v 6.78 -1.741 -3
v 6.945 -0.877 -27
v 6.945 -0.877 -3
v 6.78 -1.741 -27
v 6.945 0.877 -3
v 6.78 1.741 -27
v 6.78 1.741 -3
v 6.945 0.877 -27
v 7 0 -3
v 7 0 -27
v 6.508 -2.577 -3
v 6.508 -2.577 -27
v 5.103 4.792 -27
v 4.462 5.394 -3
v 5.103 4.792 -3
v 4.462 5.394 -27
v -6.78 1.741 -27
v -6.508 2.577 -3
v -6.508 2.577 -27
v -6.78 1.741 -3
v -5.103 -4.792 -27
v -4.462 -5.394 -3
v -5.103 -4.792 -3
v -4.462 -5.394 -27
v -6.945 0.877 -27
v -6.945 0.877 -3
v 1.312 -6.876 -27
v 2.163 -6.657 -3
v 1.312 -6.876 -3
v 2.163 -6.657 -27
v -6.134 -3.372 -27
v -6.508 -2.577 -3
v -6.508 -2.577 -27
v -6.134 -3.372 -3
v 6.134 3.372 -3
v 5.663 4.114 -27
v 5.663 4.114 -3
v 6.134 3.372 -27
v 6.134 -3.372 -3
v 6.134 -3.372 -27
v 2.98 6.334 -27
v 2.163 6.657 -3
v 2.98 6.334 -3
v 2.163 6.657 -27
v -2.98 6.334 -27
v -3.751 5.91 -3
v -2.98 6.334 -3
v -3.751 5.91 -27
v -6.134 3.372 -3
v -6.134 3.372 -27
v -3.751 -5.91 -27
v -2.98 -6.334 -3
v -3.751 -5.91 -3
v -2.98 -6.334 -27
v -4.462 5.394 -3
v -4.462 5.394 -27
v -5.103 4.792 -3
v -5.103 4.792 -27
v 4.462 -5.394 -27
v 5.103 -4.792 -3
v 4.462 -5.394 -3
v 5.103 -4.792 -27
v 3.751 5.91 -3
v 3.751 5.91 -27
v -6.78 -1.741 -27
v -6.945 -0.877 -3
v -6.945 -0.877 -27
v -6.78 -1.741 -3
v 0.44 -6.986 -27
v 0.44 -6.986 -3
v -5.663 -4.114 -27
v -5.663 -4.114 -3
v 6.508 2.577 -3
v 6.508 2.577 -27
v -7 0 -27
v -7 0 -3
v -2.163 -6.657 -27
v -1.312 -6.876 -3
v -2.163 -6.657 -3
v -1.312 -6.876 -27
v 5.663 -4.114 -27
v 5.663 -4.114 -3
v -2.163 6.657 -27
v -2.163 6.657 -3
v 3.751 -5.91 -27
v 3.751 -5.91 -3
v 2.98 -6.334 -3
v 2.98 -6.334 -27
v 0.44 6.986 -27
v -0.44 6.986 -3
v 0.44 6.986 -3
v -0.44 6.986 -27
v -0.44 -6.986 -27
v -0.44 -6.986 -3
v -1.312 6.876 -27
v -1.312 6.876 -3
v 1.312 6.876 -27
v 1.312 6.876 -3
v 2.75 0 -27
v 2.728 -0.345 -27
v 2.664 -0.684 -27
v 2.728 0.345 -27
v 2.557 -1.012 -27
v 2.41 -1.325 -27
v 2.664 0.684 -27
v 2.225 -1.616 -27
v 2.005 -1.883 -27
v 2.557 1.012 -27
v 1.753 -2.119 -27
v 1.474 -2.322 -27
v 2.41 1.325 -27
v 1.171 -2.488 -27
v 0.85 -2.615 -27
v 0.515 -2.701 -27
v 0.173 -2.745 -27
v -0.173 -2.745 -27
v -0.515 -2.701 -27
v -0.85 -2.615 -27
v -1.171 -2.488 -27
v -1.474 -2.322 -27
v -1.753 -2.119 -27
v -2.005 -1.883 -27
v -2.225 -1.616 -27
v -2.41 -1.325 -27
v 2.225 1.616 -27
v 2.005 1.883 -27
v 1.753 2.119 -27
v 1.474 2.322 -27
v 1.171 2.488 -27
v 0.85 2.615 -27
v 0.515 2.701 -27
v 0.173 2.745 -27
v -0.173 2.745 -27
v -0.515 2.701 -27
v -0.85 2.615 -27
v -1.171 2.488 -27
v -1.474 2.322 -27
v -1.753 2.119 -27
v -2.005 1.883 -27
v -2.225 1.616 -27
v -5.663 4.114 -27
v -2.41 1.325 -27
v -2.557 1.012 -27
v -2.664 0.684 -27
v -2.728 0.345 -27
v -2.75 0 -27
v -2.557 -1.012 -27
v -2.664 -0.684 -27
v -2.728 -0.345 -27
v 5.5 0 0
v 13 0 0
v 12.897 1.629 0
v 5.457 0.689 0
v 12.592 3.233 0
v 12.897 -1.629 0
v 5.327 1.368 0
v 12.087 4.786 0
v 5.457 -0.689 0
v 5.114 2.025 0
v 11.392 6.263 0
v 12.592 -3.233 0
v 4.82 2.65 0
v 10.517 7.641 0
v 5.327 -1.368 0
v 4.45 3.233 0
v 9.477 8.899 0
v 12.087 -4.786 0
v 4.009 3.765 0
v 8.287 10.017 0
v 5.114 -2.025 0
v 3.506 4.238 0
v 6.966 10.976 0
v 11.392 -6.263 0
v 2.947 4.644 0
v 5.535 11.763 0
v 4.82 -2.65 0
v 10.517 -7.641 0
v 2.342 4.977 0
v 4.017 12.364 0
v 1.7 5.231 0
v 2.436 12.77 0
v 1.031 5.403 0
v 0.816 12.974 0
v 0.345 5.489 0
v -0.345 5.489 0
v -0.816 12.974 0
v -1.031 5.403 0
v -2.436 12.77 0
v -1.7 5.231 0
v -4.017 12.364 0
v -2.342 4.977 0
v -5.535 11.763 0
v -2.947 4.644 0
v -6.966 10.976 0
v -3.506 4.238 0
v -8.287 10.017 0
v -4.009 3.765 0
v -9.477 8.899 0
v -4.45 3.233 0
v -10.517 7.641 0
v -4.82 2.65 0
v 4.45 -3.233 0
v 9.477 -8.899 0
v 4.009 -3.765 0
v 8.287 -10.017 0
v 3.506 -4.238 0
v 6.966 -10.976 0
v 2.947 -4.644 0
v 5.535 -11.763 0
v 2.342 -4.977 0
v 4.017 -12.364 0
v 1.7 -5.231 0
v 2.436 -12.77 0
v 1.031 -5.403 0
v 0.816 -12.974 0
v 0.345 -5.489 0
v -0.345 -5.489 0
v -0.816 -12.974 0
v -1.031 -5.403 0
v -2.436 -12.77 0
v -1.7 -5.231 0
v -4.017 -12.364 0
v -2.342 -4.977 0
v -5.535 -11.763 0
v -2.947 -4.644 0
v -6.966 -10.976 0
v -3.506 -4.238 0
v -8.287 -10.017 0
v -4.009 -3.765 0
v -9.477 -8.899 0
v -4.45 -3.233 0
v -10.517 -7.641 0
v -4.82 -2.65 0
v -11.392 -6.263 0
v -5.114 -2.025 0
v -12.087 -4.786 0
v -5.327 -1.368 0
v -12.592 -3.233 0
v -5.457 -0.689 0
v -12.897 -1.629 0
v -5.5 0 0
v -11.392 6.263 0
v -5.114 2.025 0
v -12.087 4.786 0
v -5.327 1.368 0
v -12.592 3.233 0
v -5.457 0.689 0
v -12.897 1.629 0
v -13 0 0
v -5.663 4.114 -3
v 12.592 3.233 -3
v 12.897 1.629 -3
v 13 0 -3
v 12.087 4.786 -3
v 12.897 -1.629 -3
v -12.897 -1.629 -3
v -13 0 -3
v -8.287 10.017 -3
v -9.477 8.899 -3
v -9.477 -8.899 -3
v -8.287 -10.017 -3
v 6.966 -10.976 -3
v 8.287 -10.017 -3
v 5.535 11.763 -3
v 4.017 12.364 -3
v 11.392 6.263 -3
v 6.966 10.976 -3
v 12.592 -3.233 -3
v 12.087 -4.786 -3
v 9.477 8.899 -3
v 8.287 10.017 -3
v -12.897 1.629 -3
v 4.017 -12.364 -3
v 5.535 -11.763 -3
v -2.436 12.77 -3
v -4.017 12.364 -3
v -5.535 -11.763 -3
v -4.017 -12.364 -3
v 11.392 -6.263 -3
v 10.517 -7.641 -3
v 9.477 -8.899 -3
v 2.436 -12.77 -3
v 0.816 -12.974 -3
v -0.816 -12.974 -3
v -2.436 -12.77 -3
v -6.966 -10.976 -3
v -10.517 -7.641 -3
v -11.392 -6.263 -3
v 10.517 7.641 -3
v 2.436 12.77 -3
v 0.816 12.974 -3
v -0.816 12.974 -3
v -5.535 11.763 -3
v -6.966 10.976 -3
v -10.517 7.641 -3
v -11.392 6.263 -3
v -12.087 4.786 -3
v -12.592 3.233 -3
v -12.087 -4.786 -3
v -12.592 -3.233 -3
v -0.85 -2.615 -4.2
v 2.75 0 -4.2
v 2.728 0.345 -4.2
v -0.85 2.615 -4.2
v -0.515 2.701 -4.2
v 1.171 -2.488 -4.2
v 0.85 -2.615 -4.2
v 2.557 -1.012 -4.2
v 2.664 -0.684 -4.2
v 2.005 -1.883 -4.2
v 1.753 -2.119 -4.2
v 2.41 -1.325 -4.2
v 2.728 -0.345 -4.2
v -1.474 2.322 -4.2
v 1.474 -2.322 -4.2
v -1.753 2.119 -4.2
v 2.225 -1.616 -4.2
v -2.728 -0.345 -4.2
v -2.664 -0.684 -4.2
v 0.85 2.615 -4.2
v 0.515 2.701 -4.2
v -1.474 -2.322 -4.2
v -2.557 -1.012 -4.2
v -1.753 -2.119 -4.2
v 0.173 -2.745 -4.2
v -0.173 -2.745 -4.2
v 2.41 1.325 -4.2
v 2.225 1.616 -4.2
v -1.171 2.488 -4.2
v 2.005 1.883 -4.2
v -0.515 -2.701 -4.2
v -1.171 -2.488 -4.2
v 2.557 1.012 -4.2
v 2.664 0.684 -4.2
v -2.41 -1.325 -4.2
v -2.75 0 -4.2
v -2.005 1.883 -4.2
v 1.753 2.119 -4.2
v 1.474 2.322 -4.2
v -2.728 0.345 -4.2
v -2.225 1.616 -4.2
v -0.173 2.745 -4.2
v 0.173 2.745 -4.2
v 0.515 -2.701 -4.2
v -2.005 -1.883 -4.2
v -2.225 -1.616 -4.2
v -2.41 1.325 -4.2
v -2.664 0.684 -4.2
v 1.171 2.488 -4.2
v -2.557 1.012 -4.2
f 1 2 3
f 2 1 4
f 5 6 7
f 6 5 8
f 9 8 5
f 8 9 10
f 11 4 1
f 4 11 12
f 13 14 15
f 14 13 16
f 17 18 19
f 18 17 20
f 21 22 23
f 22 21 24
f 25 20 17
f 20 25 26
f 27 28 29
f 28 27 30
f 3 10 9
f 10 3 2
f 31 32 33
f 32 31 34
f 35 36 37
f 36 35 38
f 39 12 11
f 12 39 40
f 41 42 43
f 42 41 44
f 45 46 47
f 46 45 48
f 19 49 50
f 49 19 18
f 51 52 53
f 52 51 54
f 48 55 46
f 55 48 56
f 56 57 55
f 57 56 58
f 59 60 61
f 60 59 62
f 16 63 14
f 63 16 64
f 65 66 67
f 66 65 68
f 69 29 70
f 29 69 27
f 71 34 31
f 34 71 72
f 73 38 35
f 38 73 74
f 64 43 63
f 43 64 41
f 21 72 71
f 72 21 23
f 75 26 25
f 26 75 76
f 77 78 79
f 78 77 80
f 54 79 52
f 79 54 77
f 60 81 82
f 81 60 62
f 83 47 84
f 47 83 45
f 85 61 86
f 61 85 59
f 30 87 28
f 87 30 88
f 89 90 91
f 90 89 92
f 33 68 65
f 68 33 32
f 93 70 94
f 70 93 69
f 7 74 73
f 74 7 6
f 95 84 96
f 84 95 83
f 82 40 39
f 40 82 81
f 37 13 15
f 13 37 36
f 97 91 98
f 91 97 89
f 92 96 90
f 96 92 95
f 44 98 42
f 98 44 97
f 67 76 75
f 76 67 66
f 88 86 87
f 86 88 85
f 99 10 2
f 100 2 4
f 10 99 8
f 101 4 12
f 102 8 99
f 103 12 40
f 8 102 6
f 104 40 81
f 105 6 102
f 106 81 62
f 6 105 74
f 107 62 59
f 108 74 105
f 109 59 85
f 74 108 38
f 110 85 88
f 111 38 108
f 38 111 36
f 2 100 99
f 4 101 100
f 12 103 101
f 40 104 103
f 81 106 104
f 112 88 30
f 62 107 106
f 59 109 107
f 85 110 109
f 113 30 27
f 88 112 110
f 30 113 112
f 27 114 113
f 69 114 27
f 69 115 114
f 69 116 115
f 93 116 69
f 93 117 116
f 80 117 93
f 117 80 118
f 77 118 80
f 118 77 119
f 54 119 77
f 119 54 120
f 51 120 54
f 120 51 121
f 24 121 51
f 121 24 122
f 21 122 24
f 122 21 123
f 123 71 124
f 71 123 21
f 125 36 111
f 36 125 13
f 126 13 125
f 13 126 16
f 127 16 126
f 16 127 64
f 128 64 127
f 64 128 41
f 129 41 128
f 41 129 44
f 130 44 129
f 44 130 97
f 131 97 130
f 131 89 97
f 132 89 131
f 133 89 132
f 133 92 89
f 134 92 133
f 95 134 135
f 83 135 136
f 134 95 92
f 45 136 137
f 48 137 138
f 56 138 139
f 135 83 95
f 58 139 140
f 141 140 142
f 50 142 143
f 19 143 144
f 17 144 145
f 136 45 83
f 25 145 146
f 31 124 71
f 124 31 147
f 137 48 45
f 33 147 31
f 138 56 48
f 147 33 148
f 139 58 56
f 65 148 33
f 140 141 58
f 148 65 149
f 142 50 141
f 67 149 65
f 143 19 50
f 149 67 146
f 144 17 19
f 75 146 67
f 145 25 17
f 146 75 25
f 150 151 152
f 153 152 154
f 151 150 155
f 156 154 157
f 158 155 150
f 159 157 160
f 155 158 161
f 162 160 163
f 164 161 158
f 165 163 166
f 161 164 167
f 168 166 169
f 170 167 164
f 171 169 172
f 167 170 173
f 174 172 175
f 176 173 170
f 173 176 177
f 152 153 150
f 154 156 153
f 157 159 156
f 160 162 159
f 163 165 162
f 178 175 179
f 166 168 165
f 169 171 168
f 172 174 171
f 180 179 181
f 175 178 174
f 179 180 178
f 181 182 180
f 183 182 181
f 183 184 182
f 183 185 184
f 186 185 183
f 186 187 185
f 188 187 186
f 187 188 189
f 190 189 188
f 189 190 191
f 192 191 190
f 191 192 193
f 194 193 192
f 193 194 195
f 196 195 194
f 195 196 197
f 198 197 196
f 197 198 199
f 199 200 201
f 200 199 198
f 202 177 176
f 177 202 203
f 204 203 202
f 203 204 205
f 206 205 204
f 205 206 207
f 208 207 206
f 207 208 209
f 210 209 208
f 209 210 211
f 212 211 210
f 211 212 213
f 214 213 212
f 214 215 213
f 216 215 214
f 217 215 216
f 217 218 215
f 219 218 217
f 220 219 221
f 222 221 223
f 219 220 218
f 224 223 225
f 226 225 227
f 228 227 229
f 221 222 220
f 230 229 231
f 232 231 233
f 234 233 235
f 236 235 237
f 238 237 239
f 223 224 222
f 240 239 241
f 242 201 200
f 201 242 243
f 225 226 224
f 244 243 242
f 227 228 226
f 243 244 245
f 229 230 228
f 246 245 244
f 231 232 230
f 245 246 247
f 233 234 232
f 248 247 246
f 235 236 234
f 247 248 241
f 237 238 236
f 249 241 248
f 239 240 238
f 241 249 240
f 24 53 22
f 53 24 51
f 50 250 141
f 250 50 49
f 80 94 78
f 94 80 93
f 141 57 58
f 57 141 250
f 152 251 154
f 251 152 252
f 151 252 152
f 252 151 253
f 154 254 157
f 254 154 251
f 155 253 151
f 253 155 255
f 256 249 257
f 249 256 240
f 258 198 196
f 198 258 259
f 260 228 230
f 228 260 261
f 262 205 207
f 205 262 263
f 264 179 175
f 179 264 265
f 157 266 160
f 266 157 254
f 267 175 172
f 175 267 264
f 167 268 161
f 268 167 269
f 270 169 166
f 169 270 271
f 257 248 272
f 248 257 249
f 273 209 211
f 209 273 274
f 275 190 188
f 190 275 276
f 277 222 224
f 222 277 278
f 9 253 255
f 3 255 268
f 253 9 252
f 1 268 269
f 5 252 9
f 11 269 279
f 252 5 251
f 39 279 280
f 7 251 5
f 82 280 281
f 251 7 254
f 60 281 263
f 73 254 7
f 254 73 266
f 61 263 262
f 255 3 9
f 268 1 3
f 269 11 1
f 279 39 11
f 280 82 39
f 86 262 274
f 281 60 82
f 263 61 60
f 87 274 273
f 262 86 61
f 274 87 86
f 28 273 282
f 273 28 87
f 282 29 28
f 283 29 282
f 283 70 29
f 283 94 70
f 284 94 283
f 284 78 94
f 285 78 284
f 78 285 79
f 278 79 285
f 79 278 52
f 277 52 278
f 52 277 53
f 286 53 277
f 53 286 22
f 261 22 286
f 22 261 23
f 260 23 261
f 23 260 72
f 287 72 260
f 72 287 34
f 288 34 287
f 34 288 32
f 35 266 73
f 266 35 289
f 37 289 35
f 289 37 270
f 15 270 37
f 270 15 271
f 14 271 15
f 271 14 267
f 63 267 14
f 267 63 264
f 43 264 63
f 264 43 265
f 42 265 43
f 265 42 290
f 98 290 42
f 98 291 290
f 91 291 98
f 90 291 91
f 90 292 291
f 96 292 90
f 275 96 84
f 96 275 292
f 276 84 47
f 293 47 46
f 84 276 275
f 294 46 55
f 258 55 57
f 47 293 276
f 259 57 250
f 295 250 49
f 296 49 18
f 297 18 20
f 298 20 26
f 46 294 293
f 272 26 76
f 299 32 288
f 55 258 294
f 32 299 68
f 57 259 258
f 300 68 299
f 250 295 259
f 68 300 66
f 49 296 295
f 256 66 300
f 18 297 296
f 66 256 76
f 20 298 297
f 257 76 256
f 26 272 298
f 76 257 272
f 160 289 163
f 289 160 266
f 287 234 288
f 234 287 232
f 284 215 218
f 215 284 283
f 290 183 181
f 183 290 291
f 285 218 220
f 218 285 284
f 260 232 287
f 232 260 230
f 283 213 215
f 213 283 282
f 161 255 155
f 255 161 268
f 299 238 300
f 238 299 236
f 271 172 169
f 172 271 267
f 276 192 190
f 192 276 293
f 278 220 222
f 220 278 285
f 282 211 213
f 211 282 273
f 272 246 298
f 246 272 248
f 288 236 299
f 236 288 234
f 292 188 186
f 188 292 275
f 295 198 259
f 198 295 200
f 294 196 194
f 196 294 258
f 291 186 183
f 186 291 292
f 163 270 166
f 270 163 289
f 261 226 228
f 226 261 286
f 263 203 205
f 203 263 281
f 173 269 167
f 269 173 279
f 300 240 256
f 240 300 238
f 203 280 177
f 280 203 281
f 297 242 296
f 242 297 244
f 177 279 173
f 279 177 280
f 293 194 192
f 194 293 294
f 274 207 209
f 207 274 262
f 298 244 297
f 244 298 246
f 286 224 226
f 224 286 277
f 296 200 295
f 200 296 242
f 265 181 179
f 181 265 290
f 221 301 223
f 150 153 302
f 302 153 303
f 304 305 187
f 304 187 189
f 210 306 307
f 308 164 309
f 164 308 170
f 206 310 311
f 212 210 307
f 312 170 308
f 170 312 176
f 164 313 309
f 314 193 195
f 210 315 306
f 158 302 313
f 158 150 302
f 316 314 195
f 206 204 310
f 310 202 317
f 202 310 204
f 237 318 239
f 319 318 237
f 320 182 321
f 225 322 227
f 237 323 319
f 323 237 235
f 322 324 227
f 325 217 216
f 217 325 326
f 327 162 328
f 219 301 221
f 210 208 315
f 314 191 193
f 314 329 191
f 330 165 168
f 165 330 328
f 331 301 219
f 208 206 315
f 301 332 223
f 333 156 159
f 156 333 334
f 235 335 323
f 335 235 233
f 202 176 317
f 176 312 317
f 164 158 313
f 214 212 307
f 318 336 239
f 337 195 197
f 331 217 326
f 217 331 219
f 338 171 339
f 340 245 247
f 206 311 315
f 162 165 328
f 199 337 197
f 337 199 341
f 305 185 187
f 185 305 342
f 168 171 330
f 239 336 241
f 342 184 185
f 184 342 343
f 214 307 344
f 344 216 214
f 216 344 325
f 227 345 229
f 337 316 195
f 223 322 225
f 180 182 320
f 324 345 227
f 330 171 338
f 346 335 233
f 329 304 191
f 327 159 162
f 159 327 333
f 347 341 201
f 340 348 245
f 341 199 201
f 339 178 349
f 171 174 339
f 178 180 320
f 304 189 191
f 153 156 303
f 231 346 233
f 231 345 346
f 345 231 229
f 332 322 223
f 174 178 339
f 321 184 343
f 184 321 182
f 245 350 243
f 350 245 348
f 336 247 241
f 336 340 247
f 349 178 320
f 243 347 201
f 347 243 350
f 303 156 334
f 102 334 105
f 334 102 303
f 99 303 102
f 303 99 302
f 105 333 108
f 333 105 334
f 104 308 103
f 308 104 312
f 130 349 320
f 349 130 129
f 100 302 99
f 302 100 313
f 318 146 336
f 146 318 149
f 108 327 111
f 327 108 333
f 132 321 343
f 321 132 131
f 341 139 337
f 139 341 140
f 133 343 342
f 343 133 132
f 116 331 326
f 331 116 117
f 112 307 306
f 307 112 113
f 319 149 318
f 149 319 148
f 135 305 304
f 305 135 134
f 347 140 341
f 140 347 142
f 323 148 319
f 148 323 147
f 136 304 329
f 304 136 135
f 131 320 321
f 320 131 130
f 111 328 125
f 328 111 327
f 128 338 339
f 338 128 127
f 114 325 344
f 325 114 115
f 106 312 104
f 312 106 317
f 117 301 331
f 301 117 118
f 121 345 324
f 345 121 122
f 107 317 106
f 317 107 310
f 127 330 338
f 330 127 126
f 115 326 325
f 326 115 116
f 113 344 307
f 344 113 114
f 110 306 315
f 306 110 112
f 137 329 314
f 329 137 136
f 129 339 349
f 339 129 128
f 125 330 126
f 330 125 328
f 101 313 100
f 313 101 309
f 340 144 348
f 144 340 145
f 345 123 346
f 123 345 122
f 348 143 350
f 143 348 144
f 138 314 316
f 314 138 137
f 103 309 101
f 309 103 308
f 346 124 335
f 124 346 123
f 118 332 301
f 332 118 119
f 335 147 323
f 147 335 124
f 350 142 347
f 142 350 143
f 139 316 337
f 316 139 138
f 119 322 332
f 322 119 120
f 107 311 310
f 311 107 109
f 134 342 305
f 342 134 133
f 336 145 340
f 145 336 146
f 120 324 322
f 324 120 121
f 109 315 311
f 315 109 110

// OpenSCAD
$fn = 50;


difference() {
	union() {
		translate(v = [0, 0, -27.0000000000]) {
			cylinder(h = 27, r = 7.0000000000);
		}
		translate(v = [0, 0, -3.0000000000]) {
			cylinder(h = 3, r = 13.0000000000);
		}
	}
	union() {
		translate(v = [0, 0, 0]) {
			rotate(a = [0, 0, 0]) {
				difference() {
					union() {
						#translate(v = [0, 0, -27.0000000000]) {
							cylinder(h = 27, r = 2.2500000000);
						}
						#translate(v = [0, 0, -4.2000000000]) {
							cylinder(h = 4.2000000000, r1 = 2.7500000000, r2 = 5.5000000000);
						}
						#translate(v = [0, 0, -27.0000000000]) {
							cylinder(h = 27, r = 2.7500000000);
						}
						#translate(v = [0, 0, -27.0000000000]) {
							cylinder(h = 27, r = 2.2500000000);
						}
					}
					union();
				}
			}
		}
	}
}
